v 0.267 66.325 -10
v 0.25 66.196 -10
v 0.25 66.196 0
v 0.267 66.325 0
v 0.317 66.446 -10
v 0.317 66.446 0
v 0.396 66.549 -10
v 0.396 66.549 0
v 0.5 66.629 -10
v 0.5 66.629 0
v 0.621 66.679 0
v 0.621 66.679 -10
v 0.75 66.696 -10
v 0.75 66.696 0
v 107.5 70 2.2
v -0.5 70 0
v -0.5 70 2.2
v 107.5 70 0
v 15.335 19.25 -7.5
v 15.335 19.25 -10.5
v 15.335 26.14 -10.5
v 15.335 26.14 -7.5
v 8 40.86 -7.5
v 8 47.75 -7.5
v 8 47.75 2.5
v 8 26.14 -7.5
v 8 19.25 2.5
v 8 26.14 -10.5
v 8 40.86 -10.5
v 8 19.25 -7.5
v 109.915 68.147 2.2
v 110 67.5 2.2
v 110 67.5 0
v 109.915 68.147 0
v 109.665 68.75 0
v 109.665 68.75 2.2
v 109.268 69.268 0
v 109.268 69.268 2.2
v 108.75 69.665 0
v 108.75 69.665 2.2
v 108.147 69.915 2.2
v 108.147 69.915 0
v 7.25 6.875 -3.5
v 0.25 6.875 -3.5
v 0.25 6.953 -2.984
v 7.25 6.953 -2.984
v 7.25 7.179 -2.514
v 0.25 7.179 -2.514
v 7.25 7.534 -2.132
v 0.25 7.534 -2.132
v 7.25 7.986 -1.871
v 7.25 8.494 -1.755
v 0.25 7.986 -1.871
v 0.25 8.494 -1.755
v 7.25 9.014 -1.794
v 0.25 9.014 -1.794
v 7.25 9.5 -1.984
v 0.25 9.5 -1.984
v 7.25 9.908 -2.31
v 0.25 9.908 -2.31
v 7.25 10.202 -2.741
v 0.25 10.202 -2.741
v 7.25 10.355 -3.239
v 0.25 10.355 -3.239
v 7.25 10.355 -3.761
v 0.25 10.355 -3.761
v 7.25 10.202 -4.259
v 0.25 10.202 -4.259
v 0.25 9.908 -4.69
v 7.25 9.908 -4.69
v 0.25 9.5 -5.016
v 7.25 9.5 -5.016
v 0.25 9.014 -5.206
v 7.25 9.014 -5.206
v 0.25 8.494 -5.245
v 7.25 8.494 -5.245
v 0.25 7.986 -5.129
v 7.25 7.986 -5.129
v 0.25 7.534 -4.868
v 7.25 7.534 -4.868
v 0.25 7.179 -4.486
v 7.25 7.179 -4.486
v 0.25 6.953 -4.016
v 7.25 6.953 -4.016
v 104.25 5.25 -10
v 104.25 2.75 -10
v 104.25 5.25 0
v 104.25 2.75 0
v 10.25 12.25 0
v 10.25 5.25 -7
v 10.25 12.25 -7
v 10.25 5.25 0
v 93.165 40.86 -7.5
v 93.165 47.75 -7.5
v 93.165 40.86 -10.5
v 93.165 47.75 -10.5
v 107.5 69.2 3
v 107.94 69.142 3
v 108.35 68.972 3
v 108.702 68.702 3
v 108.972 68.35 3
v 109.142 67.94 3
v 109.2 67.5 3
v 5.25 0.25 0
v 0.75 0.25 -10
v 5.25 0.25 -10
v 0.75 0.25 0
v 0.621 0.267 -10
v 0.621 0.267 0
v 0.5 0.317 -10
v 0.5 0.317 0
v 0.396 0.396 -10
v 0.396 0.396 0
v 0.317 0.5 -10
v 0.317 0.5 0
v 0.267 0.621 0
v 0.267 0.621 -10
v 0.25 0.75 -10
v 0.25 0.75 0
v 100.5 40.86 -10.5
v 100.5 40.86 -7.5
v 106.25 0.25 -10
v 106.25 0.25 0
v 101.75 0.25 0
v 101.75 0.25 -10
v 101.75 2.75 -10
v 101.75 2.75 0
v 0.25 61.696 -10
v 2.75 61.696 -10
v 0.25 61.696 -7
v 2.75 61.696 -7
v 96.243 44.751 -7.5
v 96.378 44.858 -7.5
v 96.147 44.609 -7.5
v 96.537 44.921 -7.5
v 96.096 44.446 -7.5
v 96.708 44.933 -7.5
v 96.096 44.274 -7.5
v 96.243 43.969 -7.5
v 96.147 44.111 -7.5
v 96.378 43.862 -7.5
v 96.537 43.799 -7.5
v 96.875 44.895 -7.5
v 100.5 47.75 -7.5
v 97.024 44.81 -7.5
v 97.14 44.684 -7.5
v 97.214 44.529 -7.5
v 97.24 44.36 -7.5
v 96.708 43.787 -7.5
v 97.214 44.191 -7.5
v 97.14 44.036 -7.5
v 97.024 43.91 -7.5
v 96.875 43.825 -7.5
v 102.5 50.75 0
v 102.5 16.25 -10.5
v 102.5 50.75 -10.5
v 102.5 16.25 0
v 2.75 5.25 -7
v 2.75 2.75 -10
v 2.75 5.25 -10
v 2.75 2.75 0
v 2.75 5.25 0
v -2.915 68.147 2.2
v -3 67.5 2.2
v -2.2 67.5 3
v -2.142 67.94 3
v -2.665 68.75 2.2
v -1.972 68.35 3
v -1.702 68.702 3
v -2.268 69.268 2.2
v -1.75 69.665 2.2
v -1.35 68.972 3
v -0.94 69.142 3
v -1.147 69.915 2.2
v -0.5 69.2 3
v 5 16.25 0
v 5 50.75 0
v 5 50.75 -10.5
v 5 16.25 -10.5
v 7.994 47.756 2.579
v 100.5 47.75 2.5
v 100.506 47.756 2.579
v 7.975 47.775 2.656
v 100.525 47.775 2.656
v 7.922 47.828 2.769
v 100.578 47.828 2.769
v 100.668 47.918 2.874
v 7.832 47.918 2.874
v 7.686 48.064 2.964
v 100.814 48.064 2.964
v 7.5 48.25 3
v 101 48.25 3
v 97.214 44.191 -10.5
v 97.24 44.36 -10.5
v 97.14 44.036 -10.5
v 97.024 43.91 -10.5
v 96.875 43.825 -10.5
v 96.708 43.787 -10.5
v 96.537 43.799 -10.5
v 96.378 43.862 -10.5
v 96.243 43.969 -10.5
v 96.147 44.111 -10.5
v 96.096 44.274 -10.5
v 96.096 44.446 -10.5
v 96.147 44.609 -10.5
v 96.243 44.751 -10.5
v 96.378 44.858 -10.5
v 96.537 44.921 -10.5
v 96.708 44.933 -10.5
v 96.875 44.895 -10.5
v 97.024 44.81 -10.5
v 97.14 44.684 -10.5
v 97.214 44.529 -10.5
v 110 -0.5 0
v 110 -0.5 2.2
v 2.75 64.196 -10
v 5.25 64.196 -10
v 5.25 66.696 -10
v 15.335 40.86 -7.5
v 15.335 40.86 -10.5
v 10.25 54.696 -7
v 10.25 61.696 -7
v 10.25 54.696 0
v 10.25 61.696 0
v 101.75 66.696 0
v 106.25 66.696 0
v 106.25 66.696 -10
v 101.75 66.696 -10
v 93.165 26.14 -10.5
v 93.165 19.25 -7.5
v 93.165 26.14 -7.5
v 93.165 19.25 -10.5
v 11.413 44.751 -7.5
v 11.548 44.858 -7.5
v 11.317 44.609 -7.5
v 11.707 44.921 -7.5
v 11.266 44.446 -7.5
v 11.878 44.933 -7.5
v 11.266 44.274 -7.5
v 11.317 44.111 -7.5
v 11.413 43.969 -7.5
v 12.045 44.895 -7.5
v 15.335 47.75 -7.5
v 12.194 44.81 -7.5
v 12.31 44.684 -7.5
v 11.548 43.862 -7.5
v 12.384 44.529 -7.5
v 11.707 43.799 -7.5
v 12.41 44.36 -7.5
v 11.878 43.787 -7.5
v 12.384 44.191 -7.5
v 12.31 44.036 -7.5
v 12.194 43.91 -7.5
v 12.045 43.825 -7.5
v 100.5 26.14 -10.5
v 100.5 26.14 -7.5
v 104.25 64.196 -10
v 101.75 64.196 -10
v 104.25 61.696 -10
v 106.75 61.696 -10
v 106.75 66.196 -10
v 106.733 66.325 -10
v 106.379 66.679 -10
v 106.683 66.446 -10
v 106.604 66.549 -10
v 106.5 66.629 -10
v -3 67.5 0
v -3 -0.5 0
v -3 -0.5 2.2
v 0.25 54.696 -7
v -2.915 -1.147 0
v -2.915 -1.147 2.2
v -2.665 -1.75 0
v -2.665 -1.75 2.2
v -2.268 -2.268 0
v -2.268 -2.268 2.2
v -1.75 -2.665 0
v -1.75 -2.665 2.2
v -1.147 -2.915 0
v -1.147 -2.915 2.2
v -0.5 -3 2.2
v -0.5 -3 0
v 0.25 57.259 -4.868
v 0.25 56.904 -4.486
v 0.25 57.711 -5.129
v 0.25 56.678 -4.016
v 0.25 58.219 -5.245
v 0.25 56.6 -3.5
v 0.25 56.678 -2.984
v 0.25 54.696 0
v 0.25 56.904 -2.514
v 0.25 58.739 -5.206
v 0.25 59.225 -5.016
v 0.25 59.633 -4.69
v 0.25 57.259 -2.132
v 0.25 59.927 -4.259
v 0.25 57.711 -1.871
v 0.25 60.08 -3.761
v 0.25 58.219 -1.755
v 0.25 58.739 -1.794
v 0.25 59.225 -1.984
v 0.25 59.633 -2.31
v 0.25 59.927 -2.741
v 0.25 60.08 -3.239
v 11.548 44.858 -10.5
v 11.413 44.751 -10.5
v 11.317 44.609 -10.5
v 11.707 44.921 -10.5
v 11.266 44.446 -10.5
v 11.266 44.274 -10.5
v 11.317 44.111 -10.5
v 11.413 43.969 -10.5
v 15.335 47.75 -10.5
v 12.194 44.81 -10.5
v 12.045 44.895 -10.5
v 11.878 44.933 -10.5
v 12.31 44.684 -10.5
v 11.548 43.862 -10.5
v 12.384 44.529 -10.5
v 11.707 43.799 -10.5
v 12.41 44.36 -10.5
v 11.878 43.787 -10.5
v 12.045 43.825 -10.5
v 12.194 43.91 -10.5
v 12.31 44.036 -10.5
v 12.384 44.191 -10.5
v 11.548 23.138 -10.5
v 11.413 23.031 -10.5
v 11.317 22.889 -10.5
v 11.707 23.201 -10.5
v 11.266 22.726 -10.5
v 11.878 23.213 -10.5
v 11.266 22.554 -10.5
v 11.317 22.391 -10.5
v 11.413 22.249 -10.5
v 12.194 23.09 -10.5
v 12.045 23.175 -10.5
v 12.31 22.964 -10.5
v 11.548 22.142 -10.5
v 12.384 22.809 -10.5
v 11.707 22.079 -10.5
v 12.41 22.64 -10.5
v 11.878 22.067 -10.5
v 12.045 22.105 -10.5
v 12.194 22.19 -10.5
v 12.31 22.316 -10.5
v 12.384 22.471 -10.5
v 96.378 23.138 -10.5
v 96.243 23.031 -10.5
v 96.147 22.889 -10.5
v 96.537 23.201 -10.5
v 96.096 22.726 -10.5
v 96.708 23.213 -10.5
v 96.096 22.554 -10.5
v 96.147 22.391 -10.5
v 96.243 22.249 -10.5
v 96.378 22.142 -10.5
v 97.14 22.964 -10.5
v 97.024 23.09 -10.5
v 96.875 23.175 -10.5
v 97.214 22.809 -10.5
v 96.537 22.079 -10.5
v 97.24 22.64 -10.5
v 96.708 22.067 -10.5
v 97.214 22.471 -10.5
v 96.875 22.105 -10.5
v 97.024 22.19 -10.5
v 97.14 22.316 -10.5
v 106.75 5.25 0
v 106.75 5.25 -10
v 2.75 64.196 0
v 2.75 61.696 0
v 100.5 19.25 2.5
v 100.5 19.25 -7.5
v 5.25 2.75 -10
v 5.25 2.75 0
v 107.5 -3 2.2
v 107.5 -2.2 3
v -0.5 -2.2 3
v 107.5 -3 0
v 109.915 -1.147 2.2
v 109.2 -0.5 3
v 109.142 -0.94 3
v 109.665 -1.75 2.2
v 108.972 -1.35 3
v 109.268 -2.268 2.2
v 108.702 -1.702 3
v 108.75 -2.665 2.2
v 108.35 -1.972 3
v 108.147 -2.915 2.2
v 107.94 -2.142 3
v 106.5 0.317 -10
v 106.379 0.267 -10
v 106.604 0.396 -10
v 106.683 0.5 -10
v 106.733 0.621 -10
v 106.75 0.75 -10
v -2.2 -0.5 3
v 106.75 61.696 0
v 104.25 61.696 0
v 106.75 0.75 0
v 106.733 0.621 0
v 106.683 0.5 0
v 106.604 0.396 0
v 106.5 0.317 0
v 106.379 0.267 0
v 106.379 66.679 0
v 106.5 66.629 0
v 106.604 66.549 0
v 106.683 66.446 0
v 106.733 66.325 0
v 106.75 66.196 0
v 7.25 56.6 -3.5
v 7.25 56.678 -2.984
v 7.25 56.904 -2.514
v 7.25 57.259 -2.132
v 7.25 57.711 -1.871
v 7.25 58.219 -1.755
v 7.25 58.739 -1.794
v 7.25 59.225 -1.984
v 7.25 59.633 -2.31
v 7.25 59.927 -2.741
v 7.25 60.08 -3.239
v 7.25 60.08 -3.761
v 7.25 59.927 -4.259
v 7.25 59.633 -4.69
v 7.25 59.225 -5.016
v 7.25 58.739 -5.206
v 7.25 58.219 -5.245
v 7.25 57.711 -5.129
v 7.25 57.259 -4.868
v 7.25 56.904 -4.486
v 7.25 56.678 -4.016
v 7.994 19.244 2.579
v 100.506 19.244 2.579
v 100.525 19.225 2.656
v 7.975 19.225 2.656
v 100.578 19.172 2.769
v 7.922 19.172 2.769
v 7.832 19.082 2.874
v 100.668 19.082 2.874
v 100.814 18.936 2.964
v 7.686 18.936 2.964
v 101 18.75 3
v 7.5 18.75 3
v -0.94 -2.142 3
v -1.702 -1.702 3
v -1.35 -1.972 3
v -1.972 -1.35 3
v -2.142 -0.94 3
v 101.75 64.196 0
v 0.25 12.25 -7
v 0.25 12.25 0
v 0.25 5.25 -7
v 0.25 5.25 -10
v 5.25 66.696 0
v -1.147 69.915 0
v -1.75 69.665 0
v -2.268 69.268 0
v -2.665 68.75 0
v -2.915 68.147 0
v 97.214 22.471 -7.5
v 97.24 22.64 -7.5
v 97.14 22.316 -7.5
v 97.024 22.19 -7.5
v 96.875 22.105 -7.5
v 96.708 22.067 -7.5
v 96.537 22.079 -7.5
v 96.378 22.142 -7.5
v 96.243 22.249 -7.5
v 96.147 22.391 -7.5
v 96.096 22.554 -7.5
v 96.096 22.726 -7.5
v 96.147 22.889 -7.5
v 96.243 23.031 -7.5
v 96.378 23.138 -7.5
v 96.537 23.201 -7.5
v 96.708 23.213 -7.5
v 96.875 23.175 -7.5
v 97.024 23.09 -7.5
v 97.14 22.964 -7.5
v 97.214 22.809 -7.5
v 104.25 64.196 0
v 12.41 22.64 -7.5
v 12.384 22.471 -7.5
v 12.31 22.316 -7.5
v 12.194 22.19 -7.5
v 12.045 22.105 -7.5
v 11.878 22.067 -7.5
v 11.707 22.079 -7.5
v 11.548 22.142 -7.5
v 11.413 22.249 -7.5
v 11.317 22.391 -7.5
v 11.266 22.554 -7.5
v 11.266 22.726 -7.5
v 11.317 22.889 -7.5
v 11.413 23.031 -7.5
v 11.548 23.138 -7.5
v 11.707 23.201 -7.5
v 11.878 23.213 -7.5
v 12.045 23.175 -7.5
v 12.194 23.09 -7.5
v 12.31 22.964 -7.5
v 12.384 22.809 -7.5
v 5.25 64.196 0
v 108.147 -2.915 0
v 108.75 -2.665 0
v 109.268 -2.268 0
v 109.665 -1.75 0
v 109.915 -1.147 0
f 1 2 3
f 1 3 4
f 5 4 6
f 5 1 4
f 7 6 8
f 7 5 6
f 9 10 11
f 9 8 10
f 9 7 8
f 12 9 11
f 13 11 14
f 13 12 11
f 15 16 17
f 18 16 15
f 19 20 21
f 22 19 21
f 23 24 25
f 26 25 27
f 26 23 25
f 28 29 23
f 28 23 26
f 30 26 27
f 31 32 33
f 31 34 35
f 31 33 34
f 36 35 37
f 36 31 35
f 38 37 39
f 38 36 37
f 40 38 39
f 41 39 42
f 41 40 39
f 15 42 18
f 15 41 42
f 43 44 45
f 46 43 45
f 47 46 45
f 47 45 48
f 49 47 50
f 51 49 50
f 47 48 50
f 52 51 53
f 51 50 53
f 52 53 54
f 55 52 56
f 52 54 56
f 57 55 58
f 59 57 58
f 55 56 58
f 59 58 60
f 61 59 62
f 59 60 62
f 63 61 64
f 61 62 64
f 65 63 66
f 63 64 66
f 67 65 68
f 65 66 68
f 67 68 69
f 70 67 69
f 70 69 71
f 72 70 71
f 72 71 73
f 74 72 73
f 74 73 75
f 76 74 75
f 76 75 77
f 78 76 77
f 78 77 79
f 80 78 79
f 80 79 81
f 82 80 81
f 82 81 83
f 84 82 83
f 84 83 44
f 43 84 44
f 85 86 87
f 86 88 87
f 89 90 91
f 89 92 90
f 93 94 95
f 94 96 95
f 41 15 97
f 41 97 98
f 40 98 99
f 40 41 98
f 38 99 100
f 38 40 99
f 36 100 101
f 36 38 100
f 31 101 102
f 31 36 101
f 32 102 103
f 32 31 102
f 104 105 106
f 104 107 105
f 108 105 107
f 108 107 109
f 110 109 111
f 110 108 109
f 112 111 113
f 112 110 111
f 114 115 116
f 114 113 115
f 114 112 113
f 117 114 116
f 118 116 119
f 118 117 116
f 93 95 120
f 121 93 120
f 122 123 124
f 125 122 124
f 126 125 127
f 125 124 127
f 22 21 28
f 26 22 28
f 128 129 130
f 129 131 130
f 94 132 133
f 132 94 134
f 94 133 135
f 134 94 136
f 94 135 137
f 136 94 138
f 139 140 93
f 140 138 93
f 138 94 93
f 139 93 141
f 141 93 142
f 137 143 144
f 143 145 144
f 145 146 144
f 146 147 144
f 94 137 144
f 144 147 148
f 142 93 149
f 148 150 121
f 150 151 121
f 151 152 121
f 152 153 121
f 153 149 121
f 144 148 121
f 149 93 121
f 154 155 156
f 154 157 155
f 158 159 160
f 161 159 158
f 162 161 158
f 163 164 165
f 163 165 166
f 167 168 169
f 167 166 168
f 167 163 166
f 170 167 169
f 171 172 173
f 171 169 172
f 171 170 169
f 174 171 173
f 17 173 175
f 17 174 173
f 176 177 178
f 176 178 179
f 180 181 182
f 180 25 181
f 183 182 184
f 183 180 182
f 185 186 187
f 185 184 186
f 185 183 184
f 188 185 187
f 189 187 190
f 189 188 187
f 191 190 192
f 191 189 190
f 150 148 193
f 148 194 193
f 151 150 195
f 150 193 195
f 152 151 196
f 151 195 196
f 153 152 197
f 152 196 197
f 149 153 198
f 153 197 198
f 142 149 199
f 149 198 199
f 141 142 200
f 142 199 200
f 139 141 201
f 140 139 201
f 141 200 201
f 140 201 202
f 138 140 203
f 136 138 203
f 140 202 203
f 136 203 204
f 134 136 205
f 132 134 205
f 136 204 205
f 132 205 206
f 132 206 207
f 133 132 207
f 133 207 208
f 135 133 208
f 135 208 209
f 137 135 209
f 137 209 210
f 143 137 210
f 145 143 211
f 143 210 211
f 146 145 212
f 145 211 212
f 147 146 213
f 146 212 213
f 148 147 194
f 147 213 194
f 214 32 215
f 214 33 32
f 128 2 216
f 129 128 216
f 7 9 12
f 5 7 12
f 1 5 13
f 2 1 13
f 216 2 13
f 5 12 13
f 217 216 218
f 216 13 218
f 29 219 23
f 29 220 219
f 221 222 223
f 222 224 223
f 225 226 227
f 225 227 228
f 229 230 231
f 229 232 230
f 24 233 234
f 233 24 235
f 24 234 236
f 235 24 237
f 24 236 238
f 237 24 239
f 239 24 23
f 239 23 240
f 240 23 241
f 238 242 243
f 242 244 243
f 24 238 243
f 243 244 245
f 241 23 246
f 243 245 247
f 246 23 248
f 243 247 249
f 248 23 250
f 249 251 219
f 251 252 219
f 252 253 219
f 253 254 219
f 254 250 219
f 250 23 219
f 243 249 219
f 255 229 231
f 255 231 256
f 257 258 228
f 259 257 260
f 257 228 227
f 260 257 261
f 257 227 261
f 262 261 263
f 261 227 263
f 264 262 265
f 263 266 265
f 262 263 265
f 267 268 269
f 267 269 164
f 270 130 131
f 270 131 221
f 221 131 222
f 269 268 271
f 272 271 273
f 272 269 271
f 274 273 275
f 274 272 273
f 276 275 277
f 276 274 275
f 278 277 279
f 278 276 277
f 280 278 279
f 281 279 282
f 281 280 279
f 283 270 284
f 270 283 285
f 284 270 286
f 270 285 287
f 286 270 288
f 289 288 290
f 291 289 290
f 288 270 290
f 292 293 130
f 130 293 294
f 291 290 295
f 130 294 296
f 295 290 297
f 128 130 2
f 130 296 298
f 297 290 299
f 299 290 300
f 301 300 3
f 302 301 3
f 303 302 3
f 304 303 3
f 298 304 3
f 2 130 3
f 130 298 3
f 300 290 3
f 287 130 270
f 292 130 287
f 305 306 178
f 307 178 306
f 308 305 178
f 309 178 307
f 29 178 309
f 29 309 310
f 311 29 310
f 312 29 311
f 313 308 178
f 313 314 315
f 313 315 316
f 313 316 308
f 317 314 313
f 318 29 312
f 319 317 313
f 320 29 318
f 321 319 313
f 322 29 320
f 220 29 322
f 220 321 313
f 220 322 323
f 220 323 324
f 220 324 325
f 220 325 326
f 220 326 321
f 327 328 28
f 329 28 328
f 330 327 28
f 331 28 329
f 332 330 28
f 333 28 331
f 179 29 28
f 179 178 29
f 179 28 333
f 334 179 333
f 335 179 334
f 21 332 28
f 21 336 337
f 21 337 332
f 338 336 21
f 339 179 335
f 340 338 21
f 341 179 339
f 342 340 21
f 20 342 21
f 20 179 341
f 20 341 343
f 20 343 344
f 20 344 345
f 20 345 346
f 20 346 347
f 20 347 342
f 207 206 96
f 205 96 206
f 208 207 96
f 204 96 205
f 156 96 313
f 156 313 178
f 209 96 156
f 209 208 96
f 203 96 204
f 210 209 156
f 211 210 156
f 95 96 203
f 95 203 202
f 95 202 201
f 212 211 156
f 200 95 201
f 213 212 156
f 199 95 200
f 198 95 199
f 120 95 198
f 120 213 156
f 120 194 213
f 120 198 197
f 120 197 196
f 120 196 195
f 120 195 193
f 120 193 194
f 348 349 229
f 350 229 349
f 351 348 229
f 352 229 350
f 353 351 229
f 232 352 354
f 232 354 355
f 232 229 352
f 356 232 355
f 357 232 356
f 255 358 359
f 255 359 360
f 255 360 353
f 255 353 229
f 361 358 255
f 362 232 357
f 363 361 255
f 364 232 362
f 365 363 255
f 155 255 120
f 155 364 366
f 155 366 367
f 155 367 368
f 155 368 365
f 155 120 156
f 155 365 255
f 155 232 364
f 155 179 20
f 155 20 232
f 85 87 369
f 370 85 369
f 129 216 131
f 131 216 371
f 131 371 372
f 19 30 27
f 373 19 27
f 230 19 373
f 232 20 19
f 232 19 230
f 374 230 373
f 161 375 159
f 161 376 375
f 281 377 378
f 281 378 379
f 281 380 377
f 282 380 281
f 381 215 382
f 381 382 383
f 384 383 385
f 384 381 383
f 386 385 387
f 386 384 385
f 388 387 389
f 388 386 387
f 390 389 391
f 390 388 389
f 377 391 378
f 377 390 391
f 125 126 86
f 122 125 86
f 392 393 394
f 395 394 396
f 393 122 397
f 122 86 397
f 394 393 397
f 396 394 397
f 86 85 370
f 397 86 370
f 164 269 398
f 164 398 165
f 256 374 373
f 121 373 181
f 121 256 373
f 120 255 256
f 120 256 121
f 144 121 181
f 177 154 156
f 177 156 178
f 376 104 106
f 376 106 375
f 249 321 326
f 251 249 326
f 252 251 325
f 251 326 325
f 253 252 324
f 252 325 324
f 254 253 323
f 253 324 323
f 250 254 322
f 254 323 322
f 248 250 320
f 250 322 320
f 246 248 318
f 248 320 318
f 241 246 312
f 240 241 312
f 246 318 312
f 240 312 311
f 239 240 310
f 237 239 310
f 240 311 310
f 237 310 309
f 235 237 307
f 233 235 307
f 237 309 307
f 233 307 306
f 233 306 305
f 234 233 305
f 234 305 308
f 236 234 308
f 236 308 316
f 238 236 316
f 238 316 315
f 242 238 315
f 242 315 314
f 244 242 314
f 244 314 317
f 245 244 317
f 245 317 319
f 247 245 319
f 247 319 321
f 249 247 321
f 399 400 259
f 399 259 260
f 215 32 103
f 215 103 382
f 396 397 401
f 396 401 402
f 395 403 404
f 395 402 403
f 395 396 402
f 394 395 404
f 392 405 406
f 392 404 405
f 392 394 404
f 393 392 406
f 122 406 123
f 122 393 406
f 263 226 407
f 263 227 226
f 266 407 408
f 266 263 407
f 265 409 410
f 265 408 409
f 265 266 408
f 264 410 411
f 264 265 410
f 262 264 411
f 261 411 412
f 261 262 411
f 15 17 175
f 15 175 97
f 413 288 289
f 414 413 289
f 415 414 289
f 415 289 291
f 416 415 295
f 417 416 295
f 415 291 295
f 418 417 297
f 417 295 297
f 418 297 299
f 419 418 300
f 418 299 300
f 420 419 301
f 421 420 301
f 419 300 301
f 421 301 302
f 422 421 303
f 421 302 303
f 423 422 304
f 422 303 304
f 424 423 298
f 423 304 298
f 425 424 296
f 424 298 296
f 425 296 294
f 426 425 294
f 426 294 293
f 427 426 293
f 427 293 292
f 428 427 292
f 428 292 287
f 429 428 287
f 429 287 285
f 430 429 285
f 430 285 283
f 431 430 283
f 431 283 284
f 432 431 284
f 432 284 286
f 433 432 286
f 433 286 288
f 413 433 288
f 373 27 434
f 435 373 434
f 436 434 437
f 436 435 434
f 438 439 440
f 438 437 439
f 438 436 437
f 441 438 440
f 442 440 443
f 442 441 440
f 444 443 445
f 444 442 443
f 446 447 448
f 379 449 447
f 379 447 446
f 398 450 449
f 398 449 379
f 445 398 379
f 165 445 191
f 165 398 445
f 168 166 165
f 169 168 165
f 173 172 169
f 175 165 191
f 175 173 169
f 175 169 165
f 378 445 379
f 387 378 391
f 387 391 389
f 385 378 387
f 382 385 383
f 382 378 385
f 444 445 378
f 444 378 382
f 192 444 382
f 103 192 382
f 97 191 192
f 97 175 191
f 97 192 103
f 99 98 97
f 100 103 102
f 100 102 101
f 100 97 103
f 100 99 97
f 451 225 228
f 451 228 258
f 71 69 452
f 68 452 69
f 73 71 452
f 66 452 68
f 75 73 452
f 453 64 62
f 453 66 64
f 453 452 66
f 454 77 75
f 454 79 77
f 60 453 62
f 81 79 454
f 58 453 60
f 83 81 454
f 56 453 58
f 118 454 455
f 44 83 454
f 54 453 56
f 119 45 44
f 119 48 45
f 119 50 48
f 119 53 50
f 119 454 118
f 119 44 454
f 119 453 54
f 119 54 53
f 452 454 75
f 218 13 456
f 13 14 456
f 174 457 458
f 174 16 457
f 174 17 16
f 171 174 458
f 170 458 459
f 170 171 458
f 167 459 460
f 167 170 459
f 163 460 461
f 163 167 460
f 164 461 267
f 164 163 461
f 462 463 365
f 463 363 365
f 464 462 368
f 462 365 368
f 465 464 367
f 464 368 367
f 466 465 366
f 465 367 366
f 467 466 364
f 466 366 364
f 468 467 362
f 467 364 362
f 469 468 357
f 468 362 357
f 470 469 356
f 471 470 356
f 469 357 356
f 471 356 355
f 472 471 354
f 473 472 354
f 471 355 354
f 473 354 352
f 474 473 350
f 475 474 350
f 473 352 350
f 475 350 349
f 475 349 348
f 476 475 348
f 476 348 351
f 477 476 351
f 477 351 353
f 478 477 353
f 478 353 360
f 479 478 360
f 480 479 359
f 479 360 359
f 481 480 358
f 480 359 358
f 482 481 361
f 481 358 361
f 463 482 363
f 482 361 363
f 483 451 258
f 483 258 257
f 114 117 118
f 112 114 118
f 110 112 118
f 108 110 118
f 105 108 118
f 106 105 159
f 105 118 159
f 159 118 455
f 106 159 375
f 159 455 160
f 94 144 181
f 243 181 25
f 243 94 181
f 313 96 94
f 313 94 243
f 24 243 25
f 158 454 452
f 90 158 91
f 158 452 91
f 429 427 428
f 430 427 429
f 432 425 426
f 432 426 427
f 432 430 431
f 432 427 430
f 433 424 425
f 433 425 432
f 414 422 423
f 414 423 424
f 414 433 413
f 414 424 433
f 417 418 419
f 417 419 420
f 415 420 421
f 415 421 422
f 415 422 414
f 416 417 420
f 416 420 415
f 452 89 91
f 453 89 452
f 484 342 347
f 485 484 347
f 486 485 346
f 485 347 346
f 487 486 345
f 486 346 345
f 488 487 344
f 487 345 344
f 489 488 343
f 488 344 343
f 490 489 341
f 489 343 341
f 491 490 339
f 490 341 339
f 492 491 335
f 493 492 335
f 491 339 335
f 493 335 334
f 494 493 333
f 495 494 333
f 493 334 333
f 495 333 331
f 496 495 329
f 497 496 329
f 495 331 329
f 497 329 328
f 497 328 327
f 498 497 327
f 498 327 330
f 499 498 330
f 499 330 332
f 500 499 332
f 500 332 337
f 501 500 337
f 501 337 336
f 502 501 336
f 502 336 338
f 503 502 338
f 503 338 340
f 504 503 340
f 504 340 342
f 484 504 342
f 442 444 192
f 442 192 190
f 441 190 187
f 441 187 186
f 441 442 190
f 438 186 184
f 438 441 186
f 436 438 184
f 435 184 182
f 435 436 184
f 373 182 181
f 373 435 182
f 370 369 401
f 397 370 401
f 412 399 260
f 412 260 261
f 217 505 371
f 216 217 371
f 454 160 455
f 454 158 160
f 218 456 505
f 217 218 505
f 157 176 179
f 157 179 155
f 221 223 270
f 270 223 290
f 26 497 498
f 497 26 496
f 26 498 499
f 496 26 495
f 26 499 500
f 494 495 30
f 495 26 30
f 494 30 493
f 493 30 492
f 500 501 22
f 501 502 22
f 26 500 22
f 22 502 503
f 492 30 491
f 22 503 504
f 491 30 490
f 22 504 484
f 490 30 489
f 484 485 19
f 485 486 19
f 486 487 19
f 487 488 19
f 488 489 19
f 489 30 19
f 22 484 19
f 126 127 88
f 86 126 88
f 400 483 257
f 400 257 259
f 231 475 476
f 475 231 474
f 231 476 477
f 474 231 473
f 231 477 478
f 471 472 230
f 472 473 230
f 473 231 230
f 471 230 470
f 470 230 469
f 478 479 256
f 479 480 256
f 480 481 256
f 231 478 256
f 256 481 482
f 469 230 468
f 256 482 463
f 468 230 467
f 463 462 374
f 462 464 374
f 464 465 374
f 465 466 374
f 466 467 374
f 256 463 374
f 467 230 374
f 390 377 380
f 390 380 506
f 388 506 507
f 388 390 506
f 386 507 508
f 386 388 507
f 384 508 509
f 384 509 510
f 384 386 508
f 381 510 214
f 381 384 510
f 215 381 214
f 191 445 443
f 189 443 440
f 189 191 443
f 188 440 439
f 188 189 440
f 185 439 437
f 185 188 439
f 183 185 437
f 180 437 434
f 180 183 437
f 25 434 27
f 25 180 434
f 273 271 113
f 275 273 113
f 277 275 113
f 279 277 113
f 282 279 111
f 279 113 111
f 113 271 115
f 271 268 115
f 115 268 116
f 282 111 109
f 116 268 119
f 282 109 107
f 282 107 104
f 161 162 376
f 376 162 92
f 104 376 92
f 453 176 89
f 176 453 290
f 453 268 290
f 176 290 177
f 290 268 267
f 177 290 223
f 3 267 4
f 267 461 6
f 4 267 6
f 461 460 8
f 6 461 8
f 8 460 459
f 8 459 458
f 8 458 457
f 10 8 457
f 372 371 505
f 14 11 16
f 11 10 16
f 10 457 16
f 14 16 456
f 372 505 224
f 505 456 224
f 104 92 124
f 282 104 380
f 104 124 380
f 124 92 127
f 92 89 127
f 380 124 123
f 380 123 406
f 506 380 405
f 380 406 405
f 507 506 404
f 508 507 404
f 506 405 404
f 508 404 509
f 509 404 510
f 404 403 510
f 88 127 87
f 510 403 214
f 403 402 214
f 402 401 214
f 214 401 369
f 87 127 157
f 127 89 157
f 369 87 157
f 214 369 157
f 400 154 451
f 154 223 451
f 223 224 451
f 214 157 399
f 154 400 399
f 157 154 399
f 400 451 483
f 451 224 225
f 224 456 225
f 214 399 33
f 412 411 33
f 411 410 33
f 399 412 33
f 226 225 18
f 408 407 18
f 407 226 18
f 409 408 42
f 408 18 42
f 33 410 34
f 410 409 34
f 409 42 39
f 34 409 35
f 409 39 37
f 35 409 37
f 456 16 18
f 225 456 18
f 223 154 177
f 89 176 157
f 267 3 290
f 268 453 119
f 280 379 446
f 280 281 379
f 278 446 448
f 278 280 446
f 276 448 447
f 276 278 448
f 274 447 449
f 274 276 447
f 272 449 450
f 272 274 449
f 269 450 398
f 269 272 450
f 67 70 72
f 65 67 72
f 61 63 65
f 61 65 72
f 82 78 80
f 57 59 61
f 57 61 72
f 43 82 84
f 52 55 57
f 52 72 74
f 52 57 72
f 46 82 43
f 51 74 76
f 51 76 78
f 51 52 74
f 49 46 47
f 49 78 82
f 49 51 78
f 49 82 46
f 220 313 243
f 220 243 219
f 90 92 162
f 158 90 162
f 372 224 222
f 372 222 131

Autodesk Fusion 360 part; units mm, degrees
sketch "Sketch1" plane through (0, 0, 0) normal (0, 0, 1) x (1, 0, 0)
  line L0 (0, 0) -> (107, 0)
  line L1 (107, 0) -> (107, 67)
  line L2 (107, 67) -> (0, 67)
  line L3 (0, 67) -> (0, 0)
  line L4 (-3, 67) -> (-3, 70)
  line L5 (-3, 70) -> (0, 70)
  line L6 (110, 0) -> (110, -3)
  line L7 (110, -3) -> (107, -3)
  line L8 (-3, 70) -> (110, 70)
  line L9 (110, 70) -> (110, -3)
  line L10 (110, -3) -> (-3, -3)
  line L11 (-3, -3) -> (-3, 70)
  dimension "d1" = 67
  dimension "d2" = 107
  dimension "d3" = 3
  dimension "d4" = 3
  dimension "d5" = 3
extrude "Extrude1" add sketch "Sketch1" along normal blind 3
extrude "Extrude2" add sketch "Sketch1" along normal blind 3 contours L0 L1 L2 L3
fillet "Fillet1" radius 2.5 4 edges at (-3, 70, 1.5) (110, 70, 1.5) (110, -3, 1.5) (-3, -3, 1.5)
sketch "Sketch2" plane through (0, 0, 0) normal (0, 0, 1) x (1, 0, 0)
  line L0 (117.8476, 33.4729) -> (-7.2698, 33.4729)
  line L1 (53.5, 5) -> (53.5, 52.788)
  line L2 (0, 67) -> (0, 0)
  line L3 (2.75, 2.75) -> (2.75, 5.25)
  line L4 (2.75, 5.25) -> (0.25, 5.25)
  line L5 (0.25, 5.25) -> (0.25, 0.25)
  line L6 (0, 0) -> (107, 0)
  line L7 (0.25, 0.25) -> (5.25, 0.25)
  line L8 (5.25, 0.25) -> (5.25, 2.75)
  line L9 (5.25, 2.75) -> (2.75, 2.75)
  line L10 (5.25, 66.6957) -> (5.25, 64.1957)
  line L11 (5.25, 64.1957) -> (2.75, 64.1957)
  line L12 (2.75, 64.1957) -> (2.75, 61.6957)
  line L13 (2.75, 61.6957) -> (0.25, 61.6957)
  line L14 (0.25, 61.6957) -> (0.25, 66.6957)
  line L15 (0.25, 66.6957) -> (5.25, 66.6957)
  line L16 (101.75, 0.25) -> (101.75, 2.75)
  line L17 (106.75, 0.25) -> (101.75, 0.25)
  line L18 (106.75, 5.25) -> (106.75, 0.25)
  line L19 (104.25, 5.25) -> (106.75, 5.25)
  line L20 (104.25, 2.75) -> (104.25, 5.25)
  line L21 (101.75, 2.75) -> (104.25, 2.75)
  line L22 (101.75, 64.1957) -> (104.25, 64.1957)
  line L23 (101.75, 66.6957) -> (101.75, 64.1957)
  line L24 (106.75, 66.6957) -> (101.75, 66.6957)
  line L25 (106.75, 61.6957) -> (106.75, 66.6957)
  line L26 (104.25, 61.6957) -> (106.75, 61.6957)
  line L27 (104.25, 64.1957) -> (104.25, 61.6957)
  line L28 (0.25, 5.25) -> (10.25, 5.25)
  line L29 (10.25, 5.25) -> (10.25, 12.25)
  line L30 (10.25, 12.25) -> (0.25, 12.25)
  line L31 (0.25, 12.25) -> (0.25, 5.25)
  line L32 (0.25, 61.6957) -> (10.25, 61.6957)
  line L33 (10.25, 61.6957) -> (10.25, 54.6957)
  line L34 (10.25, 54.6957) -> (0.25, 54.6957)
  line L35 (0.25, 54.6957) -> (0.25, 61.6957)
  dimension "d14" = 53.5
  dimension "d16" = 5
  dimension "d17" = 0.25
  dimension "d19" = 5
  dimension "d55" = 10
  dimension "d56" = 7
  dimension "d57" = 10
  dimension "d58" = 7
extrude "Extrude3" add sketch "Sketch2" against normal blind 10 contours L3 L4 L5 L7 L8 L9 L28 | L10 L11 L12 L13 L14 L15 L32 | L16 L17 L18 L19 L20 L21 | L22 L23 L24 L25 L26 L27
fillet "Fillet2" radius 0.5 4 edges at (106.75, 0.25, -5) (106.75, 66.6957, -5) (0.25, 66.6957, -5) (0.25, 0.25, -5)
sketch "Sketch3" plane through (0, 0, 0) normal (0, 0, -1) x (1, 0, 0)
  line L0 (101.75, -0.25) -> (106.25, -0.25)
  arc A0 (106.75, -0.75) -> (106.25, -0.25) centre (106.25, -0.75) ccw
  line L1 (106.75, -0.75) -> (106.75, -5.25)
  line L2 (106.75, -5.25) -> (104.25, -5.25)
  line L3 (104.25, -5.25) -> (104.25, -2.75)
  line L4 (104.25, -2.75) -> (101.75, -2.75)
  line L5 (101.75, -2.75) -> (101.75, -0.25)
  line L6 (2.75, -2.75) -> (2.75, -5.25)
  line L7 (2.75, -5.25) -> (0.25, -5.25)
  line L8 (0.25, -5.25) -> (0.25, -0.75)
  arc A1 (0.75, -0.25) -> (0.25, -0.75) centre (0.75, -0.75) ccw
  line L9 (0.75, -0.25) -> (5.25, -0.25)
  line L10 (5.25, -0.25) -> (5.25, -2.75)
  line L11 (5.25, -2.75) -> (2.75, -2.75)
  line L12 (104.25, -61.6957) -> (106.75, -61.6957)
  line L13 (106.75, -61.6957) -> (106.75, -66.1957)
  arc A2 (106.25, -66.6957) -> (106.75, -66.1957) centre (106.25, -66.1957) ccw
  line L14 (106.25, -66.6957) -> (101.75, -66.6957)
  line L15 (101.75, -66.6957) -> (101.75, -64.1957)
  line L16 (101.75, -64.1957) -> (104.25, -64.1957)
  line L17 (104.25, -64.1957) -> (104.25, -61.6957)
  line L18 (0.25, -61.6957) -> (2.75, -61.6957)
  line L19 (2.75, -61.6957) -> (2.75, -64.1957)
  line L20 (2.75, -64.1957) -> (5.25, -64.1957)
  line L21 (5.25, -64.1957) -> (5.25, -66.6957)
  line L22 (5.25, -66.6957) -> (0.75, -66.6957)
  arc A3 (0.25, -66.1957) -> (0.75, -66.6957) centre (0.75, -66.1957) ccw
  line L23 (0.25, -66.1957) -> (0.25, -61.6957)
  arc A4 (-0.5, 3) -> (-3, 0.5) centre (-0.5, 0.5) ccw
  line L24 (-3, 0.5) -> (-3, -67.5)
  arc A5 (-3, -67.5) -> (-0.5, -70) centre (-0.5, -67.5) ccw
  line L25 (-0.5, -70) -> (107.5, -70)
  arc A6 (107.5, -70) -> (110, -67.5) centre (107.5, -67.5) ccw
  line L26 (110, -67.5) -> (110, 0.5)
  arc A7 (110, 0.5) -> (107.5, 3) centre (107.5, 0.5) ccw
  line L27 (107.5, 3) -> (-0.5, 3)
  line L28 (8, -19.25) -> (100.5, -19.25)
  line L29 (100.5, -19.25) -> (100.5, -47.75)
  line L30 (100.5, -47.75) -> (8, -47.75)
  line L31 (8, -47.75) -> (8, -19.25)
  line L32 (54.25, -19.25) -> (54.25, 3)
  line L33 (54.25, -47.75) -> (54.25, -70)
  line L34 (102.5, -47.75) -> (102.5, -50.75)
  line L35 (102.5, -50.75) -> (100.5, -50.75)
  line L36 (5, -19.5) -> (5, -16.25)
  line L37 (5, -16.25) -> (8, -16.25)
  line L38 (5, -16.25) -> (102.5, -16.25)
  line L39 (102.5, -16.25) -> (102.5, -50.75)
  line L40 (102.5, -50.75) -> (5, -50.75)
  line L41 (5, -50.75) -> (5, -16.25)
  dimension "d25" = 28.5
  dimension "d26" = 92.5
  dimension "d27" = 7.75
  dimension "d28" = 2
  dimension "d29" = 3
  dimension "d30" = 3
extrude "Extrude4" cut sketch "Sketch3" against normal blind 5 contours L28 L29 L30 L31
extrude "Extrude5" add sketch "Sketch3" along normal blind 10.5 contours L28 L29 L30 L32 L33 L34 L35 L38 L39 L40 | L28 L30 L31 L32 L33 L36 L37 L38 L40 L41
sketch "Sketch4" plane through (0, 0, -10.5) normal (0, 0, -1) x (1, 0, 0)
  line L0 (100.5, -47.75) -> (8, -47.75)
  line L1 (8, -47.75) -> (8, -19.25)
  line L2 (8, -19.25) -> (100.5, -19.25)
  line L3 (100.5, -19.25) -> (100.5, -47.75)
  line L4 (5, -50.75) -> (102.5, -50.75)
  line L5 (102.5, -50.75) -> (102.5, -16.25)
  line L6 (102.5, -16.25) -> (5, -16.25)
  line L7 (5, -16.25) -> (5, -50.75)
  circle A0 centre (11.835, -22.64) radius 0.575
  circle A1 centre (96.665, -22.64) radius 0.575
  circle A2 centre (96.665, -44.36) radius 0.575
  circle A3 centre (11.835, -44.36) radius 0.575
  line L8 (12.41, -22.64) -> (15.335, -22.64)
  line L9 (15.335, -22.64) -> (15.335, -26.14)
  line L10 (15.335, -26.14) -> (11.835, -26.14)
  line L11 (11.835, -26.14) -> (11.835, -23.215)
  line L12 (12.41, -44.36) -> (15.335, -44.36)
  line L13 (15.335, -44.36) -> (15.335, -40.86)
  line L14 (15.335, -40.86) -> (11.835, -40.86)
  line L15 (11.835, -40.86) -> (11.835, -43.785)
  line L16 (96.09, -44.36) -> (93.165, -44.36)
  line L17 (93.165, -44.36) -> (93.165, -40.86)
  line L18 (93.165, -40.86) -> (96.665, -40.86)
  line L19 (96.665, -40.86) -> (96.665, -43.785)
  line L20 (96.09, -22.64) -> (93.165, -22.64)
  line L21 (93.165, -22.64) -> (93.165, -26.14)
  line L22 (93.165, -26.14) -> (96.665, -26.14)
  line L23 (96.665, -26.14) -> (96.665, -23.215)
  line L24 (93.165, -26.14) -> (100.5, -26.14)
  line L25 (100.5, -26.14) -> (100.5, -19.25)
  line L26 (100.5, -19.25) -> (93.165, -19.25)
  line L27 (93.165, -19.25) -> (93.165, -26.14)
  line L28 (93.165, -40.86) -> (100.5, -40.86)
  line L29 (100.5, -40.86) -> (100.5, -47.75)
  line L30 (100.5, -47.75) -> (93.165, -47.75)
  line L31 (93.165, -47.75) -> (93.165, -40.86)
  line L32 (15.335, -40.86) -> (8, -40.86)
  line L33 (8, -40.86) -> (8, -47.75)
  line L34 (8, -47.75) -> (15.335, -47.75)
  line L35 (15.335, -47.75) -> (15.335, -40.86)
  line L36 (15.335, -26.14) -> (8, -26.14)
  line L37 (8, -26.14) -> (8, -19.25)
  line L38 (8, -19.25) -> (15.335, -19.25)
  line L39 (15.335, -19.25) -> (15.335, -26.14)
  dimension "d36" = 84.83
  dimension "d39" = 1.15
  dimension "d40" = 1.15
  dimension "d41" = 1.15
  dimension "d42" = 1.15
  dimension "d43" = 3.5
  dimension "d44" = 3.5
  dimension "d45" = 3.5
  dimension "d46" = 3.5
  dimension "d47" = 3.5
  dimension "d48" = 3.5
  dimension "d49" = 3.5
  dimension "d50" = 3.5
extrude "Extrude6" add sketch "Sketch4" against normal blind 3 contours L0 L3 A2 L16 L19 L28 L29 L30 L31 | L0 L1 A3 L12 L15 L32 L33 L34 L35 | A2 L16 L17 L18 L19 L28 L31 | L2 L3 A1 L20 L23 L24 L25 L26 L27 | A3 L12 L13 L14 L15 L32 L35 | A1 L20 L21 L22 L23 L24 L27 | L1 L2 A0 L8 L11 L36 L37 L38 L39 | A0 L8 L9 L10 L11 L36 L39
fillet "Fillet3" radius 0.5 4 edges at (54.25, 19.25, 3) (54.25, 47.75, 3) (8, 33.5, 3) (100.5, 33.5, 3)
extrude "Extrude7" add sketch "Sketch2" against normal blind 7 contours L4 L28 L29 L30 L31 | L13 L32 L33 L34 L35
sketch "Sketch5" plane through (0.25, 0, 0) normal (-1, 0, 0) x (0, -1, 0)
  line L0 (-0.75, -10) -> (-0.75, 0)
  line L1 (-0.75, 0) -> (-12.25, 0)
  line L2 (-12.25, 0) -> (-12.25, -7)
  line L3 (-12.25, -7) -> (-5.25, -7)
  line L4 (-5.25, -7) -> (-5.25, -10)
  line L5 (-5.25, -10) -> (-0.75, -10)
  circle A0 centre (-8.625, -3.5) radius 5.0389
  circle A1 centre (-8.625, -3.5) radius 1.75
  circle A2 centre (-58.35, -3.5) radius 5.0569
  circle A3 centre (-58.35, -3.5) radius 1.75
  dimension "d61" = 3.5
  dimension "d62" = 3.5
extrude "Extrude8" cut sketch "Sketch5" against normal blind 7 contours A1 | A3
chamfer "Chamfer1" distance 0.8 angle 45 8 edges at (110, 33.5, 3) (109.2678, 69.2678, 3) (53.5, 70, 3) (-2.2678, 69.2678, 3) (-3, 33.5, 3) (-2.2678, -2.2678, 3) (53.5, -3, 3) (109.2678, -2.2678, 3)
equation "d14 = ( 107 / 2 ) * 1 mm"
